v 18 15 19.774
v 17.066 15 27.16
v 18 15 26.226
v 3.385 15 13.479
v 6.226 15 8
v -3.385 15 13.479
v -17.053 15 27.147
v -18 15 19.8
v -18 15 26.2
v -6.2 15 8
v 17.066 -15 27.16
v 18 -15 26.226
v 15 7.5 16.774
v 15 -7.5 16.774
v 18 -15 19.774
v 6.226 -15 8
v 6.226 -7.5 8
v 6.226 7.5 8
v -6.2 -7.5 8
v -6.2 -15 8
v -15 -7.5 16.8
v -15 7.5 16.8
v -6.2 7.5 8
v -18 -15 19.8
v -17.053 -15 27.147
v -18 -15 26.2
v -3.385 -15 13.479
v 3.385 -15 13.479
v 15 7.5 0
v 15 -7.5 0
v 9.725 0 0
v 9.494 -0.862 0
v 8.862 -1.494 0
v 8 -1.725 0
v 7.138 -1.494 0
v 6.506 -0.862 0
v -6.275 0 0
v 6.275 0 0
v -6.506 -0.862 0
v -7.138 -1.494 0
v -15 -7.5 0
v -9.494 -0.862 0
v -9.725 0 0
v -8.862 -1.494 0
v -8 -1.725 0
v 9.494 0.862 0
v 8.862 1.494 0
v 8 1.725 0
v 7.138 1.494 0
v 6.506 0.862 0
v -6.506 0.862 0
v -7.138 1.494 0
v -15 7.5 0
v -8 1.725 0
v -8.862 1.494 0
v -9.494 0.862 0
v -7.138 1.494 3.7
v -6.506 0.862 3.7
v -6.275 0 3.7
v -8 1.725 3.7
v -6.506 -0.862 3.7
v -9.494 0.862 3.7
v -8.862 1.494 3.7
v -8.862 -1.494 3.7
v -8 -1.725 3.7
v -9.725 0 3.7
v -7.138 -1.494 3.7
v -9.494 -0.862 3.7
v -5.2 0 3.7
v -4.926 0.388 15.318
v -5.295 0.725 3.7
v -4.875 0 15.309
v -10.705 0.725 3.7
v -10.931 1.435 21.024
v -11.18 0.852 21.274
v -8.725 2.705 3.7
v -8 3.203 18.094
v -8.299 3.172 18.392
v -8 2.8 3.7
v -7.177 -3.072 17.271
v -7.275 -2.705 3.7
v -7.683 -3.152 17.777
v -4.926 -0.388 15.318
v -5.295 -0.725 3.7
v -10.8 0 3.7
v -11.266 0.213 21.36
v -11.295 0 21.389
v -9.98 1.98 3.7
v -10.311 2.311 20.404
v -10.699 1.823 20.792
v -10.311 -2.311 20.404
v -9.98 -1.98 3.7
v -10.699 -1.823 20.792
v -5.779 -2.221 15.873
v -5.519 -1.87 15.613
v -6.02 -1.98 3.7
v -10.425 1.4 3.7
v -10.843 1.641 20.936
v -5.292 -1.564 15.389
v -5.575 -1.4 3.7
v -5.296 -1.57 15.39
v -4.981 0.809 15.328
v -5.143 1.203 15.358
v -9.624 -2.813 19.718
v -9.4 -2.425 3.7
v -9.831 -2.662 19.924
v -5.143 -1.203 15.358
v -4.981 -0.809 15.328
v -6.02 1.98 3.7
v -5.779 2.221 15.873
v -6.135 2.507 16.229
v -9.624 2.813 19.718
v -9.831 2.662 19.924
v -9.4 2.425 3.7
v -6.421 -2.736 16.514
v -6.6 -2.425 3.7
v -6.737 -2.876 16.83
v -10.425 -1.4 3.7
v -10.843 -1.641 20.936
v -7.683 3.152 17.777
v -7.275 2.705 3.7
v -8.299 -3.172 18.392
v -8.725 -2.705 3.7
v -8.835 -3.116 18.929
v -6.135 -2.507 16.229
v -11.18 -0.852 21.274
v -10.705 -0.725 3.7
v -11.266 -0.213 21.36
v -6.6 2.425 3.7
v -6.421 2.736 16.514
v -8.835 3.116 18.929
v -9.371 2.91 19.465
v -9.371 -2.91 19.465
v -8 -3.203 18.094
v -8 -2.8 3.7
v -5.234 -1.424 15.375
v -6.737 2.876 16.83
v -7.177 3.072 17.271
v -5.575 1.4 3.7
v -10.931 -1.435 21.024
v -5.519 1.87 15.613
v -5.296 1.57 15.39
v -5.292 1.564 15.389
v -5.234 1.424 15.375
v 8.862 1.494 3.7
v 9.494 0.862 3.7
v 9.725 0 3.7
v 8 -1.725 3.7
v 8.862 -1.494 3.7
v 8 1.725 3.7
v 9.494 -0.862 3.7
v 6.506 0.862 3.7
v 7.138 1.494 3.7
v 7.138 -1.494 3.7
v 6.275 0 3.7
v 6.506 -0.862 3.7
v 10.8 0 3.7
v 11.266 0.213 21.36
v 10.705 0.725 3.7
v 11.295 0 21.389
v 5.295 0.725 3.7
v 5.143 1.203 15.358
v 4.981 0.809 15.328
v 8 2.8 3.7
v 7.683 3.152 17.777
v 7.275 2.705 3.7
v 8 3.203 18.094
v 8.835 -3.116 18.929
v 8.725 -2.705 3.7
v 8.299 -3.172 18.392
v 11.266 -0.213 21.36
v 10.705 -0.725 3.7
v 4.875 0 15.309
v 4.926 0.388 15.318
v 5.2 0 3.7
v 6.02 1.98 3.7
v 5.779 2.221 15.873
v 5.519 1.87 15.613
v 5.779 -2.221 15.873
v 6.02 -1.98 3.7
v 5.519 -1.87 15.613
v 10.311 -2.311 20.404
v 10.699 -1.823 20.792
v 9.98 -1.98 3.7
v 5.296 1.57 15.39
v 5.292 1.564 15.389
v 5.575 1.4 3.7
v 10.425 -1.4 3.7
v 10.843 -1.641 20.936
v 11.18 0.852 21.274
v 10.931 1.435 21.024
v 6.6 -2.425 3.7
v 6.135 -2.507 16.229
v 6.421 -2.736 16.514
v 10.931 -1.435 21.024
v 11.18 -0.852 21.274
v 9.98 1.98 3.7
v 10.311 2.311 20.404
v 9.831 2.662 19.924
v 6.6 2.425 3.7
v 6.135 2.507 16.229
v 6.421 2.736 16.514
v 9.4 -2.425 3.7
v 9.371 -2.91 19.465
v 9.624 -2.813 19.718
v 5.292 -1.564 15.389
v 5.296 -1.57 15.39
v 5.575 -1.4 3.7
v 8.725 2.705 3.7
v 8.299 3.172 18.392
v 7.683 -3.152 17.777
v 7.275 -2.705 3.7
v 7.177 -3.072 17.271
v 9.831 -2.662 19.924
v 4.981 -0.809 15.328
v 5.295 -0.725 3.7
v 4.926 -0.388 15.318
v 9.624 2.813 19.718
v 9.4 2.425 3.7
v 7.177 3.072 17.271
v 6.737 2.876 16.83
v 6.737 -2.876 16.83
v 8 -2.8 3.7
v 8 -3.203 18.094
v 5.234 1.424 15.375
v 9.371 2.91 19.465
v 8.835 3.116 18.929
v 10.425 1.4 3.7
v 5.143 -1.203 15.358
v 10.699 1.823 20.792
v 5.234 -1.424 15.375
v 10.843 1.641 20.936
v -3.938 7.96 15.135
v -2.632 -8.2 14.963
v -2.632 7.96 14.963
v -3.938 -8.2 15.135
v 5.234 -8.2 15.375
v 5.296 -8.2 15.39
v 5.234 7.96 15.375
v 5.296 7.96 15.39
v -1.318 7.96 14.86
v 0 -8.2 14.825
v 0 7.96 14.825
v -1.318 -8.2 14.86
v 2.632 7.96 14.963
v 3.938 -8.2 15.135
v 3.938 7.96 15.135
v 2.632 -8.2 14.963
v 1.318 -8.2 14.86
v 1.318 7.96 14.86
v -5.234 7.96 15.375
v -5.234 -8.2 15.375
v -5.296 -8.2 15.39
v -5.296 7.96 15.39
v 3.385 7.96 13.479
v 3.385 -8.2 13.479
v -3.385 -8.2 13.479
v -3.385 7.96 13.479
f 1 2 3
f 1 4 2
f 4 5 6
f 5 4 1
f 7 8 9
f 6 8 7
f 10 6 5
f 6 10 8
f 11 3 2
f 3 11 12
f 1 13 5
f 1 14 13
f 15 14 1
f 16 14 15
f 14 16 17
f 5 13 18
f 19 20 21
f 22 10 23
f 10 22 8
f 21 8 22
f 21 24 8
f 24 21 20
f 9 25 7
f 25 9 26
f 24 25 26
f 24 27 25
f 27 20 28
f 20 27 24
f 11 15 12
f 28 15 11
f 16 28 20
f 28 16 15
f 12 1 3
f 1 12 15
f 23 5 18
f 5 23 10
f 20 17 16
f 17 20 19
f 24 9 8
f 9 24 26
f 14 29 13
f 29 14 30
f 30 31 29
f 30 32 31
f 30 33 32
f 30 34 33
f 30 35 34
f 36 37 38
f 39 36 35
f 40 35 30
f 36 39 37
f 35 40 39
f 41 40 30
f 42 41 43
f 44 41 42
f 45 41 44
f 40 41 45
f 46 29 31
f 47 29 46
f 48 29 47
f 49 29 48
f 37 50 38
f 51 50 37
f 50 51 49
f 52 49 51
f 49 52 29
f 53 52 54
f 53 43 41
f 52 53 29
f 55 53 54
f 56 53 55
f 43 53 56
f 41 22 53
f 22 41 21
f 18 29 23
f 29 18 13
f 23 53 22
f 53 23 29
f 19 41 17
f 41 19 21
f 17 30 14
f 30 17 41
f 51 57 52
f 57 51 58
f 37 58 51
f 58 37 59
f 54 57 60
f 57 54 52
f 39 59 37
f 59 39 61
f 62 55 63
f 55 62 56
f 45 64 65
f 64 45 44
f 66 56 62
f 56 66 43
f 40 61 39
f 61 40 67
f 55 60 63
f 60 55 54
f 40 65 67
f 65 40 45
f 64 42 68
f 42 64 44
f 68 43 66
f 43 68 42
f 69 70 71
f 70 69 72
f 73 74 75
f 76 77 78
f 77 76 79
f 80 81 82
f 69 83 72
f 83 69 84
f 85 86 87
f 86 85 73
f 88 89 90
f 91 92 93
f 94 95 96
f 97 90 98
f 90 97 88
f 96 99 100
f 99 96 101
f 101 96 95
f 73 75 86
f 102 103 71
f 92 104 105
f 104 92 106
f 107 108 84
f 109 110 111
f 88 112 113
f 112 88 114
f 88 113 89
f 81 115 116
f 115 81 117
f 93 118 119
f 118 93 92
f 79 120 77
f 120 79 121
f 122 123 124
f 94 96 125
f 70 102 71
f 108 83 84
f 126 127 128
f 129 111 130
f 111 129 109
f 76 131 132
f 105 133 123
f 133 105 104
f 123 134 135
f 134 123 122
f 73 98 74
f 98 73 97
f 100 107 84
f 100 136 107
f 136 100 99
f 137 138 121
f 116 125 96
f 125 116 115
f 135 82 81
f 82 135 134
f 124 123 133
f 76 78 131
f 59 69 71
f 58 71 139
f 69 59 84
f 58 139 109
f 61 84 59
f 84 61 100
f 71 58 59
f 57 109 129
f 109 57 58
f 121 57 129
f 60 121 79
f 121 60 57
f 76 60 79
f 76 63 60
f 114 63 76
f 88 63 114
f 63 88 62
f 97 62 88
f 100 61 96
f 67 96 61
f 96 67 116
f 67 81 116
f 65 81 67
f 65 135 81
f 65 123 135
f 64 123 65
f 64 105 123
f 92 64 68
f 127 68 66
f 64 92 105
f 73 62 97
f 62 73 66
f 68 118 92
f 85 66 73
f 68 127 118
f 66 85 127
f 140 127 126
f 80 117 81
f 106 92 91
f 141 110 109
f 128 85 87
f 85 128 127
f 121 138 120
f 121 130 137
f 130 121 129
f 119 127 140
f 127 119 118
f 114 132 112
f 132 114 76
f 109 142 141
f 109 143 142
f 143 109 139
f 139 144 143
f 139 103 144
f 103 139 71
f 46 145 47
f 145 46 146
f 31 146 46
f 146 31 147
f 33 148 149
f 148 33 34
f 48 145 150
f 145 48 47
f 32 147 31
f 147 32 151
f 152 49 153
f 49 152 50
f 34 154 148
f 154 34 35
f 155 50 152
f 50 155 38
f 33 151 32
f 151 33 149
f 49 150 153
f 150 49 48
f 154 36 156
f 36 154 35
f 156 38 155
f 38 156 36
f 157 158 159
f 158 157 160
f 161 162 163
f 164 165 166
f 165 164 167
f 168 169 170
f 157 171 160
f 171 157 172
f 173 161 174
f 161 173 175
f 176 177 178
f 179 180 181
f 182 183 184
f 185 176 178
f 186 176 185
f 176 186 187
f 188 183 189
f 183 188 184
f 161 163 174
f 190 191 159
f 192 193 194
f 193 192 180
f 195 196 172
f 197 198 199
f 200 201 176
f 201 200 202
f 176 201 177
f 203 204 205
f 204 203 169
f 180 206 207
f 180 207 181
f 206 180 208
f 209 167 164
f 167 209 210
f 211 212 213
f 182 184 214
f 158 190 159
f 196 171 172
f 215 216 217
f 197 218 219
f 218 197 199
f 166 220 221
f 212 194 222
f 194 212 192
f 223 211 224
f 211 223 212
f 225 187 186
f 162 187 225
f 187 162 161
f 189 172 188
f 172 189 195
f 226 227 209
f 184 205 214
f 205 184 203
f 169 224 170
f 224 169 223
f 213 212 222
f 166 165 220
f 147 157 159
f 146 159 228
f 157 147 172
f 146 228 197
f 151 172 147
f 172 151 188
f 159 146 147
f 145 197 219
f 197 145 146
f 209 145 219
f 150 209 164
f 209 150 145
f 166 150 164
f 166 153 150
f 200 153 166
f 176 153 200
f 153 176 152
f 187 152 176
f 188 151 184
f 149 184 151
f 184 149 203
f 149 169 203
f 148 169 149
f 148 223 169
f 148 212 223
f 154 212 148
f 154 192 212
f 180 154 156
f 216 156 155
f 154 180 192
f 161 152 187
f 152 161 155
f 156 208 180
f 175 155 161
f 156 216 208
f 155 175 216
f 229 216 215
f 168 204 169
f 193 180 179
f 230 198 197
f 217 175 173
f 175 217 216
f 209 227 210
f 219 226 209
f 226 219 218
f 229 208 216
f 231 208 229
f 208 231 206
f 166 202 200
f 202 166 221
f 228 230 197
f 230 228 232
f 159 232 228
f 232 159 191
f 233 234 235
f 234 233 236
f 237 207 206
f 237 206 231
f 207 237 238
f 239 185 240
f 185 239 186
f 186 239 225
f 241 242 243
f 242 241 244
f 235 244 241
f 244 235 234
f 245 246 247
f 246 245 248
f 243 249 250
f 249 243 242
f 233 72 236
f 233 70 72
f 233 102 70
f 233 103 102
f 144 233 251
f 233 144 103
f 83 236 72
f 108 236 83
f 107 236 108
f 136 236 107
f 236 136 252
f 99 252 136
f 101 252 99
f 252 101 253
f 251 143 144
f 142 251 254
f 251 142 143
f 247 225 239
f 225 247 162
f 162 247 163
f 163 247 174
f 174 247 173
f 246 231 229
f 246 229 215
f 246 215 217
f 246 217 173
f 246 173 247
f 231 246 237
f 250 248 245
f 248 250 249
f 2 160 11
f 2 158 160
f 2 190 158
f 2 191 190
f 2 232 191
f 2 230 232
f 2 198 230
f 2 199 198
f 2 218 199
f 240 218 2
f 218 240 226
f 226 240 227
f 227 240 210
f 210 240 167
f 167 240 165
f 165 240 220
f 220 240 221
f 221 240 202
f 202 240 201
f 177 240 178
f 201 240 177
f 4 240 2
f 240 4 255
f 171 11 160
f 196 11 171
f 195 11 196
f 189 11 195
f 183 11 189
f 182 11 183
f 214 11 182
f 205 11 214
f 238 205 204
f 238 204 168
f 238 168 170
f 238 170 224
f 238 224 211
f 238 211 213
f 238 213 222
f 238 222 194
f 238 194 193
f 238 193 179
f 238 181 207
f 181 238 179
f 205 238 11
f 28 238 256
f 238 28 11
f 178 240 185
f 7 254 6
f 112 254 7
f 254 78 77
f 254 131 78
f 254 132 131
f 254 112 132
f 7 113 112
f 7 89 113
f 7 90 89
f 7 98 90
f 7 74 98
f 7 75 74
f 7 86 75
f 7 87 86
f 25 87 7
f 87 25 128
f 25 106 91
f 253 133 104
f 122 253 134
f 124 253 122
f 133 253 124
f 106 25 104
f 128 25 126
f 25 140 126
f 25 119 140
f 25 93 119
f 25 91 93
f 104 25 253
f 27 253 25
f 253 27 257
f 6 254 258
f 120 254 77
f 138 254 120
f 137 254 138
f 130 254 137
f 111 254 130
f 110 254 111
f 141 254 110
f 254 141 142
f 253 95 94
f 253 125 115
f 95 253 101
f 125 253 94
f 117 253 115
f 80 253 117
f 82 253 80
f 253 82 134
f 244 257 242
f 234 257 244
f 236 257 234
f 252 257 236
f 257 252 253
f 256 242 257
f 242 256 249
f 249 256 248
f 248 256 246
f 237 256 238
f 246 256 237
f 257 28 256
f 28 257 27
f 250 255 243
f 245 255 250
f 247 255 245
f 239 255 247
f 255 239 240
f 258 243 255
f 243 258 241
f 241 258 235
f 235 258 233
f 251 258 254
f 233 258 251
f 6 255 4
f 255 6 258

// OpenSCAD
// file: configuration.scad
// Increase this if your slicer or printer make holes too tight.
extra_radius = 0.1;

// OD = outside diameter, corner to corner.
m3_nut_od = 6.1;
m3_nut_radius = m3_nut_od/2 + 0.2 + extra_radius;
m3_washer_radius = 3.5 + extra_radius;

// Major diameter of metric 3mm thread.
m3_major = 2.85;
m3_radius = m3_major/2 + extra_radius;
m3_wide_radius = m3_major/2 + extra_radius + 0.2;

// NEMA17 stepper motors.
motor_shaft_diameter = 5;
motor_shaft_radius = motor_shaft_diameter/2 + extra_radius;

// Frame brackets. M3x8mm screws work best with 3.6 mm brackets.
thickness = 3.6;

// OpenBeam or Misumi. Currently only 15x15 mm, but there is a plan
// to make models more parametric and allow 20x20 mm in the future.
extrusion = 15;

// Placement for the NEMA17 stepper motors.
motor_offset = 44;
motor_length = 47;
// main file
// this one turns the extruder motor on it's side relative to the extrusion rail

include <configuration.scad>;

module shortNema17body() {
  intersection() {
    translate([0,0,-.1]) cylinder(r=50/2,h=16.2,$fn=120);
    cube([42,42,40],center=true);
  }
  nema17end(9);
  translate([0,0,16+8]) nema17end(8);
  translate([0,0,16+8+5]) cylinder(h=21,r=36/2,$fn=80);
}
module nema17end(thick) {
  translate([-21,-21,-thick]) intersection() {
    cube([42,42,thick]);
    translate([21,-16,-1]) rotate([0,0,45]) cube([52.5,52.5,10]);
  }
}

module extruderMount() {
  difference() {
    union() {
      translate([-15,-7.5,0]) cube([30,15,20]);

      intersection() {
        translate([-21.2,-15,23]) rotate([0,45,0]) cube([30,30,30]);
        translate([-18,-16,8]) cube([36,32,50]);
      }
    }

    // bolt holes
    //for (x=[-11, 0, 11]) {
    for (x=[-8, 8]) {
      translate([x,0,-1]) {
        cylinder(r=m3_wide_radius, h=10, $fn=12);
        #translate([0, 0, 4.7]) cylinder(r1=2.8, r2=3.5, h=25, $fn=24);
      }
    }

    translate([0,-8.2,40]) rotate([-90,45,0])
      #scale([1.007,1.007,1.01]) shortNema17body();
  }
}

extruderMount();
